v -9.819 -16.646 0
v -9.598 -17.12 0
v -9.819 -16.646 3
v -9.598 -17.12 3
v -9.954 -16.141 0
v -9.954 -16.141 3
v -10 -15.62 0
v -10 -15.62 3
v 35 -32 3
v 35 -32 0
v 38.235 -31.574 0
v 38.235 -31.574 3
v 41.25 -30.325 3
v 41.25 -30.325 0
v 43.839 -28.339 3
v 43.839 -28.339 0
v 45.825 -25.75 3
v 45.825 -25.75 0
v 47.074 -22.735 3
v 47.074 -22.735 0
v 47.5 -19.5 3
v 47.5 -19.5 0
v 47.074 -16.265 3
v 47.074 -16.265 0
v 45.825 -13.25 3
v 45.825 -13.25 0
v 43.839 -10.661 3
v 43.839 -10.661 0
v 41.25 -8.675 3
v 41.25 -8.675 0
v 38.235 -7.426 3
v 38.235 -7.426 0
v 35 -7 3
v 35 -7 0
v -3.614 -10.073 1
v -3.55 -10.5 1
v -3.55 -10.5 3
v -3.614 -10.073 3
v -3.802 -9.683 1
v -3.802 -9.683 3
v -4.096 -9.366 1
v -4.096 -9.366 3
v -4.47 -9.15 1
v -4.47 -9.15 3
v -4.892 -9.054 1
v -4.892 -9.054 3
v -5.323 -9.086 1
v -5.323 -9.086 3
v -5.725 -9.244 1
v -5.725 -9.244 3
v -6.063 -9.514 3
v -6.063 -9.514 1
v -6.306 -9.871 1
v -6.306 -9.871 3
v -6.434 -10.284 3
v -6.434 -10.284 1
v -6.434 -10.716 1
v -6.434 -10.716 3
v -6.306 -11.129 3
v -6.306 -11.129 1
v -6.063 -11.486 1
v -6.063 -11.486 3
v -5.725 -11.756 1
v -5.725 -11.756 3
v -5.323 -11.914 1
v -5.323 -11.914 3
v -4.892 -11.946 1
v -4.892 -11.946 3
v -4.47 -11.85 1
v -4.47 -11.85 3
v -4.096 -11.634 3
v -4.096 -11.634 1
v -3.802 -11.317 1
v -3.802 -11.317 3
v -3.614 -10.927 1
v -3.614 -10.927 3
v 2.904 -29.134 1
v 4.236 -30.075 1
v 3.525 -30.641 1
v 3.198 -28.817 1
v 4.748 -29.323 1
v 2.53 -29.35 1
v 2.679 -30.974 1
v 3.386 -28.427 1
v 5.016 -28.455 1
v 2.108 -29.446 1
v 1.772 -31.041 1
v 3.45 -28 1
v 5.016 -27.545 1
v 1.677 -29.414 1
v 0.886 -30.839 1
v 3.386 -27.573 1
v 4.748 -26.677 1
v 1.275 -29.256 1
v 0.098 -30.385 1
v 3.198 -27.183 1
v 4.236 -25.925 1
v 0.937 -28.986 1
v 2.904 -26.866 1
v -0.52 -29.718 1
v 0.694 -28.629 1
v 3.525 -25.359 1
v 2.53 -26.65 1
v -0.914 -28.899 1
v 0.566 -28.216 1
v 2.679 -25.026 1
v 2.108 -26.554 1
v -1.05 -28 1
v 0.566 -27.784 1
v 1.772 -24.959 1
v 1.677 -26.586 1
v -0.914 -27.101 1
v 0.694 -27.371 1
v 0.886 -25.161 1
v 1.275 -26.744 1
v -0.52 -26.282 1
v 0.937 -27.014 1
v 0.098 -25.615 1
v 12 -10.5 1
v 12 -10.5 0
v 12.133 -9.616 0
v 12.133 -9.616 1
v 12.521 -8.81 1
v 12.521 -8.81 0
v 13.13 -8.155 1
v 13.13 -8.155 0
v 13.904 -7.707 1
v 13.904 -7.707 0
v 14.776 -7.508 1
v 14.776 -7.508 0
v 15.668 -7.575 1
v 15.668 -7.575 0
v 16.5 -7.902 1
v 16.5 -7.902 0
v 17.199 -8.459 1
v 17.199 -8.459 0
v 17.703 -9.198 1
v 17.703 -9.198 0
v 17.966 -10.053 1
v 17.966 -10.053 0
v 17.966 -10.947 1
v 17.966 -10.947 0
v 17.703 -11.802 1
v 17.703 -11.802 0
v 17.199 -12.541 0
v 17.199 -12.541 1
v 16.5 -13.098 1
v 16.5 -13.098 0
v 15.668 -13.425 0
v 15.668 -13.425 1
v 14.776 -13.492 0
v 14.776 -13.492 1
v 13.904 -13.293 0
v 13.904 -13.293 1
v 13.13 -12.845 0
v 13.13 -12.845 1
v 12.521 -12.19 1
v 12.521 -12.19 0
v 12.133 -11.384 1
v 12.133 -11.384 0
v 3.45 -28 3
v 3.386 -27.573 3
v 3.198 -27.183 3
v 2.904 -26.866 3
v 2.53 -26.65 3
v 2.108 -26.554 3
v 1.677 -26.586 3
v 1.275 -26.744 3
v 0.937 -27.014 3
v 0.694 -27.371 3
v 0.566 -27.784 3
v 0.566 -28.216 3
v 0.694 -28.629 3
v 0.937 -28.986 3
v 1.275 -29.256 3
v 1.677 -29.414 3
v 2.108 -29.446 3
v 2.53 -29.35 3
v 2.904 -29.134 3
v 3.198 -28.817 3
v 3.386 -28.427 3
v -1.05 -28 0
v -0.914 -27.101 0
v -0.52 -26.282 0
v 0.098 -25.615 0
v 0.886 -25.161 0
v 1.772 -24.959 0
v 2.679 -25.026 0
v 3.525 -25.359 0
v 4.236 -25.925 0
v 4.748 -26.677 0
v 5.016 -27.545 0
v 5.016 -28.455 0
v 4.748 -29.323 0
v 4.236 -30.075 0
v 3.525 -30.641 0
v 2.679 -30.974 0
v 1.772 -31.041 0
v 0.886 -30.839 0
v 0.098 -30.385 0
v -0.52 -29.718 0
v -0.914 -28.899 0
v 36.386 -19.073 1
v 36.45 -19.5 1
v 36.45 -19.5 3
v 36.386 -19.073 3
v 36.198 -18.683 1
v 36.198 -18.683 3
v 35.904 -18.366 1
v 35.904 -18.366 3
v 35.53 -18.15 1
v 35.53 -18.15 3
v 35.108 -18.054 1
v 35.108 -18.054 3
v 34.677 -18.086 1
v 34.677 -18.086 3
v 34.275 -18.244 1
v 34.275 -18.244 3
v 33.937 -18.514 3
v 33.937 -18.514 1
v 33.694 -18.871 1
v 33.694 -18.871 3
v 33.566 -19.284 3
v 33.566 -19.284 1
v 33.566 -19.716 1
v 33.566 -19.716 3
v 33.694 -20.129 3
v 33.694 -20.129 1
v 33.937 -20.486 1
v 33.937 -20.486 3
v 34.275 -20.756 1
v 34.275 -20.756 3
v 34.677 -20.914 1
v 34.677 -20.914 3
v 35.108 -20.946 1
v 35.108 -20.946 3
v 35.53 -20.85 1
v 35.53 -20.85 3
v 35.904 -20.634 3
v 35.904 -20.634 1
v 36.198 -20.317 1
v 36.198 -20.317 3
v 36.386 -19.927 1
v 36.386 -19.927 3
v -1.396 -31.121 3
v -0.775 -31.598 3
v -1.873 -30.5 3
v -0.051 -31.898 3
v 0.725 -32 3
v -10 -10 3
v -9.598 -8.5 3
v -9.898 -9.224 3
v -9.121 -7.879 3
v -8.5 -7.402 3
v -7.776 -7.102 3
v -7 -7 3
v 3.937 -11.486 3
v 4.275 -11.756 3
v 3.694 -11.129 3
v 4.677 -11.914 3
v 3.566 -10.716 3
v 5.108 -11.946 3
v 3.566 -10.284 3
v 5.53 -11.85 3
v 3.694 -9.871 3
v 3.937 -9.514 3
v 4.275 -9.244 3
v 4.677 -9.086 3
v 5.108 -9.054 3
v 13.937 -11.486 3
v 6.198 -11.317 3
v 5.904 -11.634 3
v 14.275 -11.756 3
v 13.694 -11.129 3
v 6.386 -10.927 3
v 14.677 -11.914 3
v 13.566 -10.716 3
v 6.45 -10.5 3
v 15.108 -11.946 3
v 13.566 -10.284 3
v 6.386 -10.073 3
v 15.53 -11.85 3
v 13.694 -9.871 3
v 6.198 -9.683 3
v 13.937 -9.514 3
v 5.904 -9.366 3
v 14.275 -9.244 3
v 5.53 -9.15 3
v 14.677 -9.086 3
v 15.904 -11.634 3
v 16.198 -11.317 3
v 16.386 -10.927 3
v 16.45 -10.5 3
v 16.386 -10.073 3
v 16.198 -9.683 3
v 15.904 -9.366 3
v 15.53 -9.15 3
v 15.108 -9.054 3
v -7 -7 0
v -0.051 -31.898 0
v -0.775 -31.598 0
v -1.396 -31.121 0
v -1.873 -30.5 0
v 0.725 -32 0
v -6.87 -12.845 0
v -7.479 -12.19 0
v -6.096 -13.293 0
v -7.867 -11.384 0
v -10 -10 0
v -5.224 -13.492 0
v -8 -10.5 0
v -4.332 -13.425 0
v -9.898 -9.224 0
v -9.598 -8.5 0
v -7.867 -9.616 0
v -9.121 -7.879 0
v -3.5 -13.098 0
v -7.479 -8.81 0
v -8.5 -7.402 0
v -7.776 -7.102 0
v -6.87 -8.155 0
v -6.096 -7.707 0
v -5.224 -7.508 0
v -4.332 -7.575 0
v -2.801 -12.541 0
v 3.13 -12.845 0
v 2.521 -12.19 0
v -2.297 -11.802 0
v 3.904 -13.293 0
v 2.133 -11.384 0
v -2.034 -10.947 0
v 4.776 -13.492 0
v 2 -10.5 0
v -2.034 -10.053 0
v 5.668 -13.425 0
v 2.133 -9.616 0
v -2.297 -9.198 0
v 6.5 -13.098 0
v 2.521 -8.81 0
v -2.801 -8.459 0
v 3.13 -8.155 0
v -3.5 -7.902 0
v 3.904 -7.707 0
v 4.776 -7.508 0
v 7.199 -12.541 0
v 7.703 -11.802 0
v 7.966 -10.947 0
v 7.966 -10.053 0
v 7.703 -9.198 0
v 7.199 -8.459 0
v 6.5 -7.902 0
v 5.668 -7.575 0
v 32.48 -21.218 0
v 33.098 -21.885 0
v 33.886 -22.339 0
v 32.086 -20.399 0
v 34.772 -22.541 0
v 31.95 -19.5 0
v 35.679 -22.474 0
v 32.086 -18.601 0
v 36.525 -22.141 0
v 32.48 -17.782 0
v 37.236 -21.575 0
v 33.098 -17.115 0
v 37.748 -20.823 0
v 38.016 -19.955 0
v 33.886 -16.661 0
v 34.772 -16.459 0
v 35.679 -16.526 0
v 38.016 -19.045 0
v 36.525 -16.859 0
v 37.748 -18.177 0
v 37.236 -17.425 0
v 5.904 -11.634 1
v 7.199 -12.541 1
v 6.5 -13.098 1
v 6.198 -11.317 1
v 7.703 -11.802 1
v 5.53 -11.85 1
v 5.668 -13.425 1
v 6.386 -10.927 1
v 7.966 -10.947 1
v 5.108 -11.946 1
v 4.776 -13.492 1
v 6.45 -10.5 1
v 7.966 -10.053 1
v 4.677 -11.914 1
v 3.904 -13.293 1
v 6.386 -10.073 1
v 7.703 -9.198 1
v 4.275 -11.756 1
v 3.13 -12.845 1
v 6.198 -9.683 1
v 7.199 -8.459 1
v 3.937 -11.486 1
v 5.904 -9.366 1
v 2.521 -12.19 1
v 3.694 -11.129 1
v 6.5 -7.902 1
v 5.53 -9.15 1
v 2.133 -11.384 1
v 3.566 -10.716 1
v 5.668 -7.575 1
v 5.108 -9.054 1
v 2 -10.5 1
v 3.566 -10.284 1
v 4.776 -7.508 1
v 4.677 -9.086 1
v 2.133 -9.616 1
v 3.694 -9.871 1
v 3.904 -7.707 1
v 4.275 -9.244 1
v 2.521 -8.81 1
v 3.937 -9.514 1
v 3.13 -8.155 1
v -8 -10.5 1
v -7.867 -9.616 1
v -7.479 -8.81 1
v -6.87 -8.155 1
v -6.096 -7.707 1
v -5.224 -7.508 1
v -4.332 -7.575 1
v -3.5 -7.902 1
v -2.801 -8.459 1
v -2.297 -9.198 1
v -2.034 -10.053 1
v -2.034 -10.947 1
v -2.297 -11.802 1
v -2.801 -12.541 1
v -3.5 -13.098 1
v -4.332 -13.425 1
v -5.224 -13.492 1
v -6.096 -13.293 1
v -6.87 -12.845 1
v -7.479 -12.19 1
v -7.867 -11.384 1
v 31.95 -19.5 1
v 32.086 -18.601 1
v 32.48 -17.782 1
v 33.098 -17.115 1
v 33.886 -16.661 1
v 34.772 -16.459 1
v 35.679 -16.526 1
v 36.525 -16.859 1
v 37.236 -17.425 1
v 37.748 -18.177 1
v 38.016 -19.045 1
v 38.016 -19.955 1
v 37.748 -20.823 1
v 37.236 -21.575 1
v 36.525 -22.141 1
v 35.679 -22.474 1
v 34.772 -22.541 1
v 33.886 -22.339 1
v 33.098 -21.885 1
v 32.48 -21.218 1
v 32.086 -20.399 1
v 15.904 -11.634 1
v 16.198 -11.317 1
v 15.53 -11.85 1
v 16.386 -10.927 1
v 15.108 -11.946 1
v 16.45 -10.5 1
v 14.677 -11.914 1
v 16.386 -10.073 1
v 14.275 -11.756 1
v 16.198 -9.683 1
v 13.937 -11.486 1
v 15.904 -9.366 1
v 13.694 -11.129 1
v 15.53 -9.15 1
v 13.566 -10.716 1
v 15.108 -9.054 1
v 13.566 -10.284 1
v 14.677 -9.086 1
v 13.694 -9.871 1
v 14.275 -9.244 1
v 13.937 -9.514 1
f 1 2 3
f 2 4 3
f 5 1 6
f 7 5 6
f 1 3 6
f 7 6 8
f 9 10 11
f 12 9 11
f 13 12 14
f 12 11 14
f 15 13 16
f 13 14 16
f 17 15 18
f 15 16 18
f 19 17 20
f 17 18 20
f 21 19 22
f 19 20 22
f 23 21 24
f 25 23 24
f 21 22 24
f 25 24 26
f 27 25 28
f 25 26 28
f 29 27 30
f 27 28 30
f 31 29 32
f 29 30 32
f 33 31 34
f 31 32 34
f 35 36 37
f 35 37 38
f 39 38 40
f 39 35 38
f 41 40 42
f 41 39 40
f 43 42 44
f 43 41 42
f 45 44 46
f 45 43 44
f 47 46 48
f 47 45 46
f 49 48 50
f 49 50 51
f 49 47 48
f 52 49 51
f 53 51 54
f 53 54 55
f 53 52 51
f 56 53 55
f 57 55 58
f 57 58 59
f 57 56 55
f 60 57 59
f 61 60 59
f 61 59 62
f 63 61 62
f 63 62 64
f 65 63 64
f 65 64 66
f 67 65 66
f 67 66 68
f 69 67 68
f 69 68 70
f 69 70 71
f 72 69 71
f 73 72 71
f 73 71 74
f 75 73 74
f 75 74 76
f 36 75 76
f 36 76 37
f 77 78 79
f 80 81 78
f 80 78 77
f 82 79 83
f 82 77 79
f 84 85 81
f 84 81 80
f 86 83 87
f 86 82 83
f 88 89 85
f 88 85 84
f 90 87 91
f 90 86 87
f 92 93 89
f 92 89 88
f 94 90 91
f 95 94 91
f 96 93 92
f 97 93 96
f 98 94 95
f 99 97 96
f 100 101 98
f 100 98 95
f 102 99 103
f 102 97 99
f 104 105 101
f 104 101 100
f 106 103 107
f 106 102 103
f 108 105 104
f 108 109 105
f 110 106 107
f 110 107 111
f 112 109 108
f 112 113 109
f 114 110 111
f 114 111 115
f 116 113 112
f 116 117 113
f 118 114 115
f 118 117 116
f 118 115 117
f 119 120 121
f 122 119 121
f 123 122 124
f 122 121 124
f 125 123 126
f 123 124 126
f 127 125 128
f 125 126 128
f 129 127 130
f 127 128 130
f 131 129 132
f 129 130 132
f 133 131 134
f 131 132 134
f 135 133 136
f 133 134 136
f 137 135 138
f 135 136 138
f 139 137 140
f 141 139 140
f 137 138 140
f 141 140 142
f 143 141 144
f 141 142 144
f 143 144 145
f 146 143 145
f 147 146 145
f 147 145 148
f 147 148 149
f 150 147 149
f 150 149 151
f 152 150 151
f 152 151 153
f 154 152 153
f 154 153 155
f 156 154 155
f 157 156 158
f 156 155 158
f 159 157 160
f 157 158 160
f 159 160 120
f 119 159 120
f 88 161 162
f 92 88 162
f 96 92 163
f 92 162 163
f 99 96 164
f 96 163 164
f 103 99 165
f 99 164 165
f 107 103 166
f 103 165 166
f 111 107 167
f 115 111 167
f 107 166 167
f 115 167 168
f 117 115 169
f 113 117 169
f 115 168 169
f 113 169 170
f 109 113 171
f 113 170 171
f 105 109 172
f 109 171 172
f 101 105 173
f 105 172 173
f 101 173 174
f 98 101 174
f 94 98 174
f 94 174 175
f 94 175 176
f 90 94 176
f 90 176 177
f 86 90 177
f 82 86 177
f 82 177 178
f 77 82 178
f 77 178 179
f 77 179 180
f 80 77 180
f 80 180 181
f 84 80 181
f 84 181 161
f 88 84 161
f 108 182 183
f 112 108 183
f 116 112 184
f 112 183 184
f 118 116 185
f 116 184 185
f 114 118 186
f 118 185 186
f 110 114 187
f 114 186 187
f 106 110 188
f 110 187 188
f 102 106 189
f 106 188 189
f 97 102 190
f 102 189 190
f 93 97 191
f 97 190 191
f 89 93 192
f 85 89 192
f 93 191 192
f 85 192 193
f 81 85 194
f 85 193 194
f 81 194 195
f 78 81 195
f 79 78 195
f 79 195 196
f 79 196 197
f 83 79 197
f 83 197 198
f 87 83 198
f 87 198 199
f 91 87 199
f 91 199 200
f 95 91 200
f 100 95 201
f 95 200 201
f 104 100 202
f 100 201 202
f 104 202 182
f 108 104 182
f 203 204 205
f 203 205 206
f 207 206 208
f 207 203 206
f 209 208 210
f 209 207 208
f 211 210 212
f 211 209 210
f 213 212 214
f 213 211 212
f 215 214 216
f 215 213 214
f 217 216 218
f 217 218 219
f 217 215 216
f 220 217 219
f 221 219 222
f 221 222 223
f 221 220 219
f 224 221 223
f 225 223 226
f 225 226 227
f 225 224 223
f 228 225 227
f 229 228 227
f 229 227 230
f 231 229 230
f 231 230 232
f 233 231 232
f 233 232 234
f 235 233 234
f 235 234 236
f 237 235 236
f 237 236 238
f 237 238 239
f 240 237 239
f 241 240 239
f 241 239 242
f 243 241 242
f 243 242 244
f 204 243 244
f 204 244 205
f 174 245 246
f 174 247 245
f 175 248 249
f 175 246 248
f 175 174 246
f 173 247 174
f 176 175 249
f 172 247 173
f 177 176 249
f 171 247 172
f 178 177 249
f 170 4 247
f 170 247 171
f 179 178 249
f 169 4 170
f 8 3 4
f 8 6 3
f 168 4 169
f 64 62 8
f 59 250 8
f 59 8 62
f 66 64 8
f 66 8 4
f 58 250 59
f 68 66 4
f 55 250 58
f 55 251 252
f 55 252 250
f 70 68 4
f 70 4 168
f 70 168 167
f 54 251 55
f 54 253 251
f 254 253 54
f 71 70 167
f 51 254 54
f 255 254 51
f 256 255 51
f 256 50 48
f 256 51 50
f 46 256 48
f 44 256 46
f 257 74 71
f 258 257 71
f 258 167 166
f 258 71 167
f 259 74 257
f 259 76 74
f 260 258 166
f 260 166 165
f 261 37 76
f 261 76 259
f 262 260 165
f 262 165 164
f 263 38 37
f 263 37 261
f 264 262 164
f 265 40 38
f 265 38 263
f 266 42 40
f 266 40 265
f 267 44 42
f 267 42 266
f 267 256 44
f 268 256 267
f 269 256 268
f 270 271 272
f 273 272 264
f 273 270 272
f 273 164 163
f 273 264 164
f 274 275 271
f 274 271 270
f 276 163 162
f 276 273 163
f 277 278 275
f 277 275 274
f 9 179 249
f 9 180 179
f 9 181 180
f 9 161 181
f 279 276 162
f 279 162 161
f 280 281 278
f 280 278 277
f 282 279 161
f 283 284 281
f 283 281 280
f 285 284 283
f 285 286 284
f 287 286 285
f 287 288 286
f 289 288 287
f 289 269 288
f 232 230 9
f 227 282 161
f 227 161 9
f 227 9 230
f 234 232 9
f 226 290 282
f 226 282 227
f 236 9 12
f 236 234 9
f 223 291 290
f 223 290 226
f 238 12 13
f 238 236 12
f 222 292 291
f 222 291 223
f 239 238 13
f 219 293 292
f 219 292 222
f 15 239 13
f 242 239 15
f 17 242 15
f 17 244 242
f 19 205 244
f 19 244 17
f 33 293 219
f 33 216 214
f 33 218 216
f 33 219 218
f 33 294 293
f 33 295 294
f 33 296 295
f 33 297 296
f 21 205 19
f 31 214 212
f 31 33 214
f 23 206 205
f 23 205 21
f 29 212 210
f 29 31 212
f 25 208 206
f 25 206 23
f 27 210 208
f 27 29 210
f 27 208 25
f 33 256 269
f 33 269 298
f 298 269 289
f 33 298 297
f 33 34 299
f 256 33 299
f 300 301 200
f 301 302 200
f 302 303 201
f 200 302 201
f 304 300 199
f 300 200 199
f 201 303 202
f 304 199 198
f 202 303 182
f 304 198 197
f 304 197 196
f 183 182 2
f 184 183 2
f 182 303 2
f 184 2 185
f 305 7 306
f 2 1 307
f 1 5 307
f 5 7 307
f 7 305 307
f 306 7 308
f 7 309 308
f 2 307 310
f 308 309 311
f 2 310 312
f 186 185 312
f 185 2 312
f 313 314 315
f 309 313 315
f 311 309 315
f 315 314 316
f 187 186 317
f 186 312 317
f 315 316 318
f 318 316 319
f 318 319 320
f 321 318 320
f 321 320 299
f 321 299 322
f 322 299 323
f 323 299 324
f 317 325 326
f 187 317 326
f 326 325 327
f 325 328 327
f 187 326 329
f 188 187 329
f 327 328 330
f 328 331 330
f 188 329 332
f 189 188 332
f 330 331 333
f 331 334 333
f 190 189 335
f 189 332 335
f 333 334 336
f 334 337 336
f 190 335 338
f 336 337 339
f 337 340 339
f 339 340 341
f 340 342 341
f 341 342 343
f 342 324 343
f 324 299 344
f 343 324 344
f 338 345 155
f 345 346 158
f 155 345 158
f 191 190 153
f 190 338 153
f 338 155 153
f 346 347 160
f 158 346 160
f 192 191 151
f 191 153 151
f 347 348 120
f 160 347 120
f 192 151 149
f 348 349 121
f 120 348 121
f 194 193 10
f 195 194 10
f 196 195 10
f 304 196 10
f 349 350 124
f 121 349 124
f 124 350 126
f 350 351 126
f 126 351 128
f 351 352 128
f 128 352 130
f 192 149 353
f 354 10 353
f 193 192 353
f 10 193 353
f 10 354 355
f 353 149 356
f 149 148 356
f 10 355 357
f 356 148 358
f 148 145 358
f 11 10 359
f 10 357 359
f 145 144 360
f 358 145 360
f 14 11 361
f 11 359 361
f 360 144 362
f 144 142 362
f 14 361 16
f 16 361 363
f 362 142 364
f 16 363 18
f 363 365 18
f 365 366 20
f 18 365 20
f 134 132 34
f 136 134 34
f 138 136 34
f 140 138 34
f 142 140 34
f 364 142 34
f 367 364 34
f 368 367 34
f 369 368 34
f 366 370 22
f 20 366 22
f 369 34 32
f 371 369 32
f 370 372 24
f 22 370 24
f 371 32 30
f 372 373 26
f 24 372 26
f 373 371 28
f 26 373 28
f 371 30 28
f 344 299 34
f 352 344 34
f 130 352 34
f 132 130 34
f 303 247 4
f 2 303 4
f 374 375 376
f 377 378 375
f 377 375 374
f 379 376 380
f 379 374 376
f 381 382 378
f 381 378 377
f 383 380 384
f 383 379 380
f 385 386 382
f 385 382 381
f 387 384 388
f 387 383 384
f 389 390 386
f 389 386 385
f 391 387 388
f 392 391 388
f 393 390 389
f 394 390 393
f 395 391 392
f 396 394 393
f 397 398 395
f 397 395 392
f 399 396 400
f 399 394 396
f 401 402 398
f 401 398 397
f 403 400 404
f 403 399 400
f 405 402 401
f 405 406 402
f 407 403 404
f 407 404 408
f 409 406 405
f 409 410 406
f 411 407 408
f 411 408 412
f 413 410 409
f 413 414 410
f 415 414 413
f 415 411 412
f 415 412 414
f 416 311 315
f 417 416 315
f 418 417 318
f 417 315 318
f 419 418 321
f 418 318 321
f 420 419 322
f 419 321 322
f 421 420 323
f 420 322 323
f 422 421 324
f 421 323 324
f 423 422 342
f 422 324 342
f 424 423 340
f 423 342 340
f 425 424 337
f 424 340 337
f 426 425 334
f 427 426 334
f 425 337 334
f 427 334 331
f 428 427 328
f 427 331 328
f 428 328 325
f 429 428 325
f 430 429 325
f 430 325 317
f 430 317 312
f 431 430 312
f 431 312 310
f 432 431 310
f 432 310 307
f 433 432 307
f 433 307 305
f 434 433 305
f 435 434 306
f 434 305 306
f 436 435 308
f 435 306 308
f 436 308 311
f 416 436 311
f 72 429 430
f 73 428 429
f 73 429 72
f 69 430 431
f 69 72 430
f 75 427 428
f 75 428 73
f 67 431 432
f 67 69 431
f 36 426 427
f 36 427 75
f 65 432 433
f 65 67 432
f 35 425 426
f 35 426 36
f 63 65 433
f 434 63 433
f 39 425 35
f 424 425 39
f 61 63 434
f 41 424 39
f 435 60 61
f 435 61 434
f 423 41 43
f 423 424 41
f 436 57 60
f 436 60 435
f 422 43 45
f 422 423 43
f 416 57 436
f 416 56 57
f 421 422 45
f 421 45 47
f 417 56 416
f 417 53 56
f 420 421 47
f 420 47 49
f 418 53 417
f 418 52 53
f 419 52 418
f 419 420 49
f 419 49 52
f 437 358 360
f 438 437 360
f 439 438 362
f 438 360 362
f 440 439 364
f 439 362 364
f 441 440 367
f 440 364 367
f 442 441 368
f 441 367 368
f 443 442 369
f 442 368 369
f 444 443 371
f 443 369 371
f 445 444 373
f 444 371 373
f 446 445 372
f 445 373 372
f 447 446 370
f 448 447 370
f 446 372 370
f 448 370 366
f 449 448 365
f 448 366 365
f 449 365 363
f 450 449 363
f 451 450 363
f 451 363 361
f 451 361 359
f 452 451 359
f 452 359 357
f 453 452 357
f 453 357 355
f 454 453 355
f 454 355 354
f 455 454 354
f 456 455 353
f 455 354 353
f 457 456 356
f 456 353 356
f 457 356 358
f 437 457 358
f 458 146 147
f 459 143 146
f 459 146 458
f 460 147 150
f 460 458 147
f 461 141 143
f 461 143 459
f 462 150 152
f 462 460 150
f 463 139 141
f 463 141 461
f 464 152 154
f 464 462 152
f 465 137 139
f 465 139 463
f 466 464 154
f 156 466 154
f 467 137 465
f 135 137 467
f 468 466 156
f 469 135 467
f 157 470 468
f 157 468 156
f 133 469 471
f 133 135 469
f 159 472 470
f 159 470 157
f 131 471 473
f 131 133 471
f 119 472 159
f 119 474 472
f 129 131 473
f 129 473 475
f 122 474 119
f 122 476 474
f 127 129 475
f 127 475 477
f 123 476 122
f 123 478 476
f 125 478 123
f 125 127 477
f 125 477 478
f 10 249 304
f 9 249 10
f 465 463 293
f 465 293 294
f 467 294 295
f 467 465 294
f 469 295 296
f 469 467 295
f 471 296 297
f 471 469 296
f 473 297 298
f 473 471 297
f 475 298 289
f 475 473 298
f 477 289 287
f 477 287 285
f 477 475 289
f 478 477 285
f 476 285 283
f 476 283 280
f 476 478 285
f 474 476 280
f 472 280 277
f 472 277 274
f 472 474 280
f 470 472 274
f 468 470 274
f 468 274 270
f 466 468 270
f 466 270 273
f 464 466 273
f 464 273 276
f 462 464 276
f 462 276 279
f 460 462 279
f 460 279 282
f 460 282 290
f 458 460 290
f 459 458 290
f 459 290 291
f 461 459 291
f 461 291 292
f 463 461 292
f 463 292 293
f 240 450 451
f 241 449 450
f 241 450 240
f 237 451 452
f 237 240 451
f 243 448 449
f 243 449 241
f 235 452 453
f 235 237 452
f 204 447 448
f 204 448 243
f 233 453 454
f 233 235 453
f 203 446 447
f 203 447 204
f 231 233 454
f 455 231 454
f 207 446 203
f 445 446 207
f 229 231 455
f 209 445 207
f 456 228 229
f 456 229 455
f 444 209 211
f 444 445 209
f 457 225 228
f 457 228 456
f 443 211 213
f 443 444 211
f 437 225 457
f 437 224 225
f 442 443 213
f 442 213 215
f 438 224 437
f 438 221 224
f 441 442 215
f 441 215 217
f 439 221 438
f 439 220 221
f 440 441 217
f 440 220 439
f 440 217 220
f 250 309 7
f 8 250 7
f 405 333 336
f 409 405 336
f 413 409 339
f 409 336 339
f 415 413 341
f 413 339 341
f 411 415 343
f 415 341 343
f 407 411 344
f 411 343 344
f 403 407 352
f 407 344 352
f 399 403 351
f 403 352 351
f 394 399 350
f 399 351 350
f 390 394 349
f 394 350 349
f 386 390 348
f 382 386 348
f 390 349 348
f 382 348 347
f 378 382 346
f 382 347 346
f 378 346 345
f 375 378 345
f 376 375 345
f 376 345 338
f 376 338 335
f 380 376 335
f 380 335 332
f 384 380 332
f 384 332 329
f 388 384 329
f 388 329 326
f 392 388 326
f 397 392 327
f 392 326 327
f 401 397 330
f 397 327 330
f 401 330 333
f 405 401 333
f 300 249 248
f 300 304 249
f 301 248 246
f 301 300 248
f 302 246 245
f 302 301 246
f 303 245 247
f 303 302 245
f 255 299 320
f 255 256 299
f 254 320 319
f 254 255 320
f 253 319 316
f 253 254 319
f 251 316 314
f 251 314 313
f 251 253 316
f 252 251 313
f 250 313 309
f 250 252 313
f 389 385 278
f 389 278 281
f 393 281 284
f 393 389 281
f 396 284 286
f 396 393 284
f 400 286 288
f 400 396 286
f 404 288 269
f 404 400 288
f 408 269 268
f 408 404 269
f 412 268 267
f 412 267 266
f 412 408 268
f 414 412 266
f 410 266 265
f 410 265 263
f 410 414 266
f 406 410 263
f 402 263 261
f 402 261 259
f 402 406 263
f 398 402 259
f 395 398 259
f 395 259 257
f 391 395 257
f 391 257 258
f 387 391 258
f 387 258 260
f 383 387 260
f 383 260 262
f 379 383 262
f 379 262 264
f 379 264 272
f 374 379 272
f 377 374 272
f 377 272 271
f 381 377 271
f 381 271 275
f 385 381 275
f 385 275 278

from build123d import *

# Parameters (mm, degrees)
SKETCH_2_R          = 1.45
EXTRUDE_1_DEPTH     = 3
SKETCH_3_R          = 1.45
EXTRUDE_2_DEPTH     = 3
SKETCH_6_R          = 3
CUT_EXTRUDE_2_DEPTH = 1
EXTRUDE_3_DEPTH     = 3
SKETCH_9_R          = 3.05
CUT_EXTRUDE_5_DEPTH = 1
FILLET_1_R          = 3
SKETCH_11_R         = 3.05
CUT_EXTRUDE_7_DEPTH = 1


with BuildPart() as part:
    # 草图2 → 凸台-拉伸1 (new body)
    with BuildSketch(Plane.XY):
        with BuildLine():
            Line((-10, -7), (-10, -16.423561614))
            Line((-10, -16.423561614), (30.724748208, -31.24615776))
            ThreePointArc((30.724748208, -31.24615776), (47.310096913, -21.670602221), (35, -7))
            Line((35, -7), (-10, -7))
        make_face()
        with Locations((35, -19.5)):
            Circle(SKETCH_2_R, mode=Mode.SUBTRACT)
        with Locations((15, -10.5)):
            Circle(SKETCH_2_R, mode=Mode.SUBTRACT)
        with Locations((5, -10.5)):
            Circle(SKETCH_2_R, mode=Mode.SUBTRACT)
        with Locations((-5, -10.5)):
            Circle(SKETCH_2_R, mode=Mode.SUBTRACT)
    extrude(amount=EXTRUDE_1_DEPTH)

    # 草图3 → 凸台-拉伸2 (add)
    with BuildSketch(Plane.XY.offset(3)):
        Polygon((-10, -16.423561614), (32.795912741, -32), (-1.006939105, -32), align=None)
        with Locations((2, -28)):
            Circle(SKETCH_3_R, mode=Mode.SUBTRACT)
    extrude(amount=-EXTRUDE_2_DEPTH)

    # 草图6 → 切除-拉伸2 (cut)
    with BuildSketch(Plane(origin=(0, 0, 0), x_dir=(-1, 0, 0), z_dir=(0, 0, -1))):
        with Locations((-15, -10.5)):
            Circle(SKETCH_6_R)
        with Locations((-5, -10.5)):
            Circle(SKETCH_6_R)
        with Locations((5, -10.5)):
            Circle(SKETCH_6_R)
    extrude(amount=-CUT_EXTRUDE_2_DEPTH, mode=Mode.SUBTRACT)

    # 草图8 → 凸台-拉伸3 (add)
    with BuildSketch(Plane.XY.offset(3)):
        Polygon((32.795912741, -32), (35, -32), (30.724748208, -31.24615776), align=None)
    extrude(amount=-EXTRUDE_3_DEPTH)

    # 草图9 → 切除-拉伸5 (cut)
    with BuildSketch(Plane(origin=(0, 0, 0), x_dir=(-1, 0, 0), z_dir=(0, 0, -1))):
        with Locations((-2, -28)):
            Circle(SKETCH_9_R)
    extrude(amount=-CUT_EXTRUDE_5_DEPTH, mode=Mode.SUBTRACT)

    # 圆角1
    fillet_1_edges = [part.edges().sort_by_distance(p)[0] for p in [
        (-1.006939105, -32, 1.5),
        (-10, -16.423561614, 1.5),
        (-10, -7, 1.5),
    ]]
    fillet(fillet_1_edges, radius=FILLET_1_R)

    # 草图11 → 切除-拉伸7 (cut)
    with BuildSketch(Plane(origin=(0, 0, 0), x_dir=(-1, 0, 0), z_dir=(0, 0, -1))):
        with Locations((-35, -19.5)):
            Circle(SKETCH_11_R)
    extrude(amount=-CUT_EXTRUDE_7_DEPTH, mode=Mode.SUBTRACT)


solid = part.part
